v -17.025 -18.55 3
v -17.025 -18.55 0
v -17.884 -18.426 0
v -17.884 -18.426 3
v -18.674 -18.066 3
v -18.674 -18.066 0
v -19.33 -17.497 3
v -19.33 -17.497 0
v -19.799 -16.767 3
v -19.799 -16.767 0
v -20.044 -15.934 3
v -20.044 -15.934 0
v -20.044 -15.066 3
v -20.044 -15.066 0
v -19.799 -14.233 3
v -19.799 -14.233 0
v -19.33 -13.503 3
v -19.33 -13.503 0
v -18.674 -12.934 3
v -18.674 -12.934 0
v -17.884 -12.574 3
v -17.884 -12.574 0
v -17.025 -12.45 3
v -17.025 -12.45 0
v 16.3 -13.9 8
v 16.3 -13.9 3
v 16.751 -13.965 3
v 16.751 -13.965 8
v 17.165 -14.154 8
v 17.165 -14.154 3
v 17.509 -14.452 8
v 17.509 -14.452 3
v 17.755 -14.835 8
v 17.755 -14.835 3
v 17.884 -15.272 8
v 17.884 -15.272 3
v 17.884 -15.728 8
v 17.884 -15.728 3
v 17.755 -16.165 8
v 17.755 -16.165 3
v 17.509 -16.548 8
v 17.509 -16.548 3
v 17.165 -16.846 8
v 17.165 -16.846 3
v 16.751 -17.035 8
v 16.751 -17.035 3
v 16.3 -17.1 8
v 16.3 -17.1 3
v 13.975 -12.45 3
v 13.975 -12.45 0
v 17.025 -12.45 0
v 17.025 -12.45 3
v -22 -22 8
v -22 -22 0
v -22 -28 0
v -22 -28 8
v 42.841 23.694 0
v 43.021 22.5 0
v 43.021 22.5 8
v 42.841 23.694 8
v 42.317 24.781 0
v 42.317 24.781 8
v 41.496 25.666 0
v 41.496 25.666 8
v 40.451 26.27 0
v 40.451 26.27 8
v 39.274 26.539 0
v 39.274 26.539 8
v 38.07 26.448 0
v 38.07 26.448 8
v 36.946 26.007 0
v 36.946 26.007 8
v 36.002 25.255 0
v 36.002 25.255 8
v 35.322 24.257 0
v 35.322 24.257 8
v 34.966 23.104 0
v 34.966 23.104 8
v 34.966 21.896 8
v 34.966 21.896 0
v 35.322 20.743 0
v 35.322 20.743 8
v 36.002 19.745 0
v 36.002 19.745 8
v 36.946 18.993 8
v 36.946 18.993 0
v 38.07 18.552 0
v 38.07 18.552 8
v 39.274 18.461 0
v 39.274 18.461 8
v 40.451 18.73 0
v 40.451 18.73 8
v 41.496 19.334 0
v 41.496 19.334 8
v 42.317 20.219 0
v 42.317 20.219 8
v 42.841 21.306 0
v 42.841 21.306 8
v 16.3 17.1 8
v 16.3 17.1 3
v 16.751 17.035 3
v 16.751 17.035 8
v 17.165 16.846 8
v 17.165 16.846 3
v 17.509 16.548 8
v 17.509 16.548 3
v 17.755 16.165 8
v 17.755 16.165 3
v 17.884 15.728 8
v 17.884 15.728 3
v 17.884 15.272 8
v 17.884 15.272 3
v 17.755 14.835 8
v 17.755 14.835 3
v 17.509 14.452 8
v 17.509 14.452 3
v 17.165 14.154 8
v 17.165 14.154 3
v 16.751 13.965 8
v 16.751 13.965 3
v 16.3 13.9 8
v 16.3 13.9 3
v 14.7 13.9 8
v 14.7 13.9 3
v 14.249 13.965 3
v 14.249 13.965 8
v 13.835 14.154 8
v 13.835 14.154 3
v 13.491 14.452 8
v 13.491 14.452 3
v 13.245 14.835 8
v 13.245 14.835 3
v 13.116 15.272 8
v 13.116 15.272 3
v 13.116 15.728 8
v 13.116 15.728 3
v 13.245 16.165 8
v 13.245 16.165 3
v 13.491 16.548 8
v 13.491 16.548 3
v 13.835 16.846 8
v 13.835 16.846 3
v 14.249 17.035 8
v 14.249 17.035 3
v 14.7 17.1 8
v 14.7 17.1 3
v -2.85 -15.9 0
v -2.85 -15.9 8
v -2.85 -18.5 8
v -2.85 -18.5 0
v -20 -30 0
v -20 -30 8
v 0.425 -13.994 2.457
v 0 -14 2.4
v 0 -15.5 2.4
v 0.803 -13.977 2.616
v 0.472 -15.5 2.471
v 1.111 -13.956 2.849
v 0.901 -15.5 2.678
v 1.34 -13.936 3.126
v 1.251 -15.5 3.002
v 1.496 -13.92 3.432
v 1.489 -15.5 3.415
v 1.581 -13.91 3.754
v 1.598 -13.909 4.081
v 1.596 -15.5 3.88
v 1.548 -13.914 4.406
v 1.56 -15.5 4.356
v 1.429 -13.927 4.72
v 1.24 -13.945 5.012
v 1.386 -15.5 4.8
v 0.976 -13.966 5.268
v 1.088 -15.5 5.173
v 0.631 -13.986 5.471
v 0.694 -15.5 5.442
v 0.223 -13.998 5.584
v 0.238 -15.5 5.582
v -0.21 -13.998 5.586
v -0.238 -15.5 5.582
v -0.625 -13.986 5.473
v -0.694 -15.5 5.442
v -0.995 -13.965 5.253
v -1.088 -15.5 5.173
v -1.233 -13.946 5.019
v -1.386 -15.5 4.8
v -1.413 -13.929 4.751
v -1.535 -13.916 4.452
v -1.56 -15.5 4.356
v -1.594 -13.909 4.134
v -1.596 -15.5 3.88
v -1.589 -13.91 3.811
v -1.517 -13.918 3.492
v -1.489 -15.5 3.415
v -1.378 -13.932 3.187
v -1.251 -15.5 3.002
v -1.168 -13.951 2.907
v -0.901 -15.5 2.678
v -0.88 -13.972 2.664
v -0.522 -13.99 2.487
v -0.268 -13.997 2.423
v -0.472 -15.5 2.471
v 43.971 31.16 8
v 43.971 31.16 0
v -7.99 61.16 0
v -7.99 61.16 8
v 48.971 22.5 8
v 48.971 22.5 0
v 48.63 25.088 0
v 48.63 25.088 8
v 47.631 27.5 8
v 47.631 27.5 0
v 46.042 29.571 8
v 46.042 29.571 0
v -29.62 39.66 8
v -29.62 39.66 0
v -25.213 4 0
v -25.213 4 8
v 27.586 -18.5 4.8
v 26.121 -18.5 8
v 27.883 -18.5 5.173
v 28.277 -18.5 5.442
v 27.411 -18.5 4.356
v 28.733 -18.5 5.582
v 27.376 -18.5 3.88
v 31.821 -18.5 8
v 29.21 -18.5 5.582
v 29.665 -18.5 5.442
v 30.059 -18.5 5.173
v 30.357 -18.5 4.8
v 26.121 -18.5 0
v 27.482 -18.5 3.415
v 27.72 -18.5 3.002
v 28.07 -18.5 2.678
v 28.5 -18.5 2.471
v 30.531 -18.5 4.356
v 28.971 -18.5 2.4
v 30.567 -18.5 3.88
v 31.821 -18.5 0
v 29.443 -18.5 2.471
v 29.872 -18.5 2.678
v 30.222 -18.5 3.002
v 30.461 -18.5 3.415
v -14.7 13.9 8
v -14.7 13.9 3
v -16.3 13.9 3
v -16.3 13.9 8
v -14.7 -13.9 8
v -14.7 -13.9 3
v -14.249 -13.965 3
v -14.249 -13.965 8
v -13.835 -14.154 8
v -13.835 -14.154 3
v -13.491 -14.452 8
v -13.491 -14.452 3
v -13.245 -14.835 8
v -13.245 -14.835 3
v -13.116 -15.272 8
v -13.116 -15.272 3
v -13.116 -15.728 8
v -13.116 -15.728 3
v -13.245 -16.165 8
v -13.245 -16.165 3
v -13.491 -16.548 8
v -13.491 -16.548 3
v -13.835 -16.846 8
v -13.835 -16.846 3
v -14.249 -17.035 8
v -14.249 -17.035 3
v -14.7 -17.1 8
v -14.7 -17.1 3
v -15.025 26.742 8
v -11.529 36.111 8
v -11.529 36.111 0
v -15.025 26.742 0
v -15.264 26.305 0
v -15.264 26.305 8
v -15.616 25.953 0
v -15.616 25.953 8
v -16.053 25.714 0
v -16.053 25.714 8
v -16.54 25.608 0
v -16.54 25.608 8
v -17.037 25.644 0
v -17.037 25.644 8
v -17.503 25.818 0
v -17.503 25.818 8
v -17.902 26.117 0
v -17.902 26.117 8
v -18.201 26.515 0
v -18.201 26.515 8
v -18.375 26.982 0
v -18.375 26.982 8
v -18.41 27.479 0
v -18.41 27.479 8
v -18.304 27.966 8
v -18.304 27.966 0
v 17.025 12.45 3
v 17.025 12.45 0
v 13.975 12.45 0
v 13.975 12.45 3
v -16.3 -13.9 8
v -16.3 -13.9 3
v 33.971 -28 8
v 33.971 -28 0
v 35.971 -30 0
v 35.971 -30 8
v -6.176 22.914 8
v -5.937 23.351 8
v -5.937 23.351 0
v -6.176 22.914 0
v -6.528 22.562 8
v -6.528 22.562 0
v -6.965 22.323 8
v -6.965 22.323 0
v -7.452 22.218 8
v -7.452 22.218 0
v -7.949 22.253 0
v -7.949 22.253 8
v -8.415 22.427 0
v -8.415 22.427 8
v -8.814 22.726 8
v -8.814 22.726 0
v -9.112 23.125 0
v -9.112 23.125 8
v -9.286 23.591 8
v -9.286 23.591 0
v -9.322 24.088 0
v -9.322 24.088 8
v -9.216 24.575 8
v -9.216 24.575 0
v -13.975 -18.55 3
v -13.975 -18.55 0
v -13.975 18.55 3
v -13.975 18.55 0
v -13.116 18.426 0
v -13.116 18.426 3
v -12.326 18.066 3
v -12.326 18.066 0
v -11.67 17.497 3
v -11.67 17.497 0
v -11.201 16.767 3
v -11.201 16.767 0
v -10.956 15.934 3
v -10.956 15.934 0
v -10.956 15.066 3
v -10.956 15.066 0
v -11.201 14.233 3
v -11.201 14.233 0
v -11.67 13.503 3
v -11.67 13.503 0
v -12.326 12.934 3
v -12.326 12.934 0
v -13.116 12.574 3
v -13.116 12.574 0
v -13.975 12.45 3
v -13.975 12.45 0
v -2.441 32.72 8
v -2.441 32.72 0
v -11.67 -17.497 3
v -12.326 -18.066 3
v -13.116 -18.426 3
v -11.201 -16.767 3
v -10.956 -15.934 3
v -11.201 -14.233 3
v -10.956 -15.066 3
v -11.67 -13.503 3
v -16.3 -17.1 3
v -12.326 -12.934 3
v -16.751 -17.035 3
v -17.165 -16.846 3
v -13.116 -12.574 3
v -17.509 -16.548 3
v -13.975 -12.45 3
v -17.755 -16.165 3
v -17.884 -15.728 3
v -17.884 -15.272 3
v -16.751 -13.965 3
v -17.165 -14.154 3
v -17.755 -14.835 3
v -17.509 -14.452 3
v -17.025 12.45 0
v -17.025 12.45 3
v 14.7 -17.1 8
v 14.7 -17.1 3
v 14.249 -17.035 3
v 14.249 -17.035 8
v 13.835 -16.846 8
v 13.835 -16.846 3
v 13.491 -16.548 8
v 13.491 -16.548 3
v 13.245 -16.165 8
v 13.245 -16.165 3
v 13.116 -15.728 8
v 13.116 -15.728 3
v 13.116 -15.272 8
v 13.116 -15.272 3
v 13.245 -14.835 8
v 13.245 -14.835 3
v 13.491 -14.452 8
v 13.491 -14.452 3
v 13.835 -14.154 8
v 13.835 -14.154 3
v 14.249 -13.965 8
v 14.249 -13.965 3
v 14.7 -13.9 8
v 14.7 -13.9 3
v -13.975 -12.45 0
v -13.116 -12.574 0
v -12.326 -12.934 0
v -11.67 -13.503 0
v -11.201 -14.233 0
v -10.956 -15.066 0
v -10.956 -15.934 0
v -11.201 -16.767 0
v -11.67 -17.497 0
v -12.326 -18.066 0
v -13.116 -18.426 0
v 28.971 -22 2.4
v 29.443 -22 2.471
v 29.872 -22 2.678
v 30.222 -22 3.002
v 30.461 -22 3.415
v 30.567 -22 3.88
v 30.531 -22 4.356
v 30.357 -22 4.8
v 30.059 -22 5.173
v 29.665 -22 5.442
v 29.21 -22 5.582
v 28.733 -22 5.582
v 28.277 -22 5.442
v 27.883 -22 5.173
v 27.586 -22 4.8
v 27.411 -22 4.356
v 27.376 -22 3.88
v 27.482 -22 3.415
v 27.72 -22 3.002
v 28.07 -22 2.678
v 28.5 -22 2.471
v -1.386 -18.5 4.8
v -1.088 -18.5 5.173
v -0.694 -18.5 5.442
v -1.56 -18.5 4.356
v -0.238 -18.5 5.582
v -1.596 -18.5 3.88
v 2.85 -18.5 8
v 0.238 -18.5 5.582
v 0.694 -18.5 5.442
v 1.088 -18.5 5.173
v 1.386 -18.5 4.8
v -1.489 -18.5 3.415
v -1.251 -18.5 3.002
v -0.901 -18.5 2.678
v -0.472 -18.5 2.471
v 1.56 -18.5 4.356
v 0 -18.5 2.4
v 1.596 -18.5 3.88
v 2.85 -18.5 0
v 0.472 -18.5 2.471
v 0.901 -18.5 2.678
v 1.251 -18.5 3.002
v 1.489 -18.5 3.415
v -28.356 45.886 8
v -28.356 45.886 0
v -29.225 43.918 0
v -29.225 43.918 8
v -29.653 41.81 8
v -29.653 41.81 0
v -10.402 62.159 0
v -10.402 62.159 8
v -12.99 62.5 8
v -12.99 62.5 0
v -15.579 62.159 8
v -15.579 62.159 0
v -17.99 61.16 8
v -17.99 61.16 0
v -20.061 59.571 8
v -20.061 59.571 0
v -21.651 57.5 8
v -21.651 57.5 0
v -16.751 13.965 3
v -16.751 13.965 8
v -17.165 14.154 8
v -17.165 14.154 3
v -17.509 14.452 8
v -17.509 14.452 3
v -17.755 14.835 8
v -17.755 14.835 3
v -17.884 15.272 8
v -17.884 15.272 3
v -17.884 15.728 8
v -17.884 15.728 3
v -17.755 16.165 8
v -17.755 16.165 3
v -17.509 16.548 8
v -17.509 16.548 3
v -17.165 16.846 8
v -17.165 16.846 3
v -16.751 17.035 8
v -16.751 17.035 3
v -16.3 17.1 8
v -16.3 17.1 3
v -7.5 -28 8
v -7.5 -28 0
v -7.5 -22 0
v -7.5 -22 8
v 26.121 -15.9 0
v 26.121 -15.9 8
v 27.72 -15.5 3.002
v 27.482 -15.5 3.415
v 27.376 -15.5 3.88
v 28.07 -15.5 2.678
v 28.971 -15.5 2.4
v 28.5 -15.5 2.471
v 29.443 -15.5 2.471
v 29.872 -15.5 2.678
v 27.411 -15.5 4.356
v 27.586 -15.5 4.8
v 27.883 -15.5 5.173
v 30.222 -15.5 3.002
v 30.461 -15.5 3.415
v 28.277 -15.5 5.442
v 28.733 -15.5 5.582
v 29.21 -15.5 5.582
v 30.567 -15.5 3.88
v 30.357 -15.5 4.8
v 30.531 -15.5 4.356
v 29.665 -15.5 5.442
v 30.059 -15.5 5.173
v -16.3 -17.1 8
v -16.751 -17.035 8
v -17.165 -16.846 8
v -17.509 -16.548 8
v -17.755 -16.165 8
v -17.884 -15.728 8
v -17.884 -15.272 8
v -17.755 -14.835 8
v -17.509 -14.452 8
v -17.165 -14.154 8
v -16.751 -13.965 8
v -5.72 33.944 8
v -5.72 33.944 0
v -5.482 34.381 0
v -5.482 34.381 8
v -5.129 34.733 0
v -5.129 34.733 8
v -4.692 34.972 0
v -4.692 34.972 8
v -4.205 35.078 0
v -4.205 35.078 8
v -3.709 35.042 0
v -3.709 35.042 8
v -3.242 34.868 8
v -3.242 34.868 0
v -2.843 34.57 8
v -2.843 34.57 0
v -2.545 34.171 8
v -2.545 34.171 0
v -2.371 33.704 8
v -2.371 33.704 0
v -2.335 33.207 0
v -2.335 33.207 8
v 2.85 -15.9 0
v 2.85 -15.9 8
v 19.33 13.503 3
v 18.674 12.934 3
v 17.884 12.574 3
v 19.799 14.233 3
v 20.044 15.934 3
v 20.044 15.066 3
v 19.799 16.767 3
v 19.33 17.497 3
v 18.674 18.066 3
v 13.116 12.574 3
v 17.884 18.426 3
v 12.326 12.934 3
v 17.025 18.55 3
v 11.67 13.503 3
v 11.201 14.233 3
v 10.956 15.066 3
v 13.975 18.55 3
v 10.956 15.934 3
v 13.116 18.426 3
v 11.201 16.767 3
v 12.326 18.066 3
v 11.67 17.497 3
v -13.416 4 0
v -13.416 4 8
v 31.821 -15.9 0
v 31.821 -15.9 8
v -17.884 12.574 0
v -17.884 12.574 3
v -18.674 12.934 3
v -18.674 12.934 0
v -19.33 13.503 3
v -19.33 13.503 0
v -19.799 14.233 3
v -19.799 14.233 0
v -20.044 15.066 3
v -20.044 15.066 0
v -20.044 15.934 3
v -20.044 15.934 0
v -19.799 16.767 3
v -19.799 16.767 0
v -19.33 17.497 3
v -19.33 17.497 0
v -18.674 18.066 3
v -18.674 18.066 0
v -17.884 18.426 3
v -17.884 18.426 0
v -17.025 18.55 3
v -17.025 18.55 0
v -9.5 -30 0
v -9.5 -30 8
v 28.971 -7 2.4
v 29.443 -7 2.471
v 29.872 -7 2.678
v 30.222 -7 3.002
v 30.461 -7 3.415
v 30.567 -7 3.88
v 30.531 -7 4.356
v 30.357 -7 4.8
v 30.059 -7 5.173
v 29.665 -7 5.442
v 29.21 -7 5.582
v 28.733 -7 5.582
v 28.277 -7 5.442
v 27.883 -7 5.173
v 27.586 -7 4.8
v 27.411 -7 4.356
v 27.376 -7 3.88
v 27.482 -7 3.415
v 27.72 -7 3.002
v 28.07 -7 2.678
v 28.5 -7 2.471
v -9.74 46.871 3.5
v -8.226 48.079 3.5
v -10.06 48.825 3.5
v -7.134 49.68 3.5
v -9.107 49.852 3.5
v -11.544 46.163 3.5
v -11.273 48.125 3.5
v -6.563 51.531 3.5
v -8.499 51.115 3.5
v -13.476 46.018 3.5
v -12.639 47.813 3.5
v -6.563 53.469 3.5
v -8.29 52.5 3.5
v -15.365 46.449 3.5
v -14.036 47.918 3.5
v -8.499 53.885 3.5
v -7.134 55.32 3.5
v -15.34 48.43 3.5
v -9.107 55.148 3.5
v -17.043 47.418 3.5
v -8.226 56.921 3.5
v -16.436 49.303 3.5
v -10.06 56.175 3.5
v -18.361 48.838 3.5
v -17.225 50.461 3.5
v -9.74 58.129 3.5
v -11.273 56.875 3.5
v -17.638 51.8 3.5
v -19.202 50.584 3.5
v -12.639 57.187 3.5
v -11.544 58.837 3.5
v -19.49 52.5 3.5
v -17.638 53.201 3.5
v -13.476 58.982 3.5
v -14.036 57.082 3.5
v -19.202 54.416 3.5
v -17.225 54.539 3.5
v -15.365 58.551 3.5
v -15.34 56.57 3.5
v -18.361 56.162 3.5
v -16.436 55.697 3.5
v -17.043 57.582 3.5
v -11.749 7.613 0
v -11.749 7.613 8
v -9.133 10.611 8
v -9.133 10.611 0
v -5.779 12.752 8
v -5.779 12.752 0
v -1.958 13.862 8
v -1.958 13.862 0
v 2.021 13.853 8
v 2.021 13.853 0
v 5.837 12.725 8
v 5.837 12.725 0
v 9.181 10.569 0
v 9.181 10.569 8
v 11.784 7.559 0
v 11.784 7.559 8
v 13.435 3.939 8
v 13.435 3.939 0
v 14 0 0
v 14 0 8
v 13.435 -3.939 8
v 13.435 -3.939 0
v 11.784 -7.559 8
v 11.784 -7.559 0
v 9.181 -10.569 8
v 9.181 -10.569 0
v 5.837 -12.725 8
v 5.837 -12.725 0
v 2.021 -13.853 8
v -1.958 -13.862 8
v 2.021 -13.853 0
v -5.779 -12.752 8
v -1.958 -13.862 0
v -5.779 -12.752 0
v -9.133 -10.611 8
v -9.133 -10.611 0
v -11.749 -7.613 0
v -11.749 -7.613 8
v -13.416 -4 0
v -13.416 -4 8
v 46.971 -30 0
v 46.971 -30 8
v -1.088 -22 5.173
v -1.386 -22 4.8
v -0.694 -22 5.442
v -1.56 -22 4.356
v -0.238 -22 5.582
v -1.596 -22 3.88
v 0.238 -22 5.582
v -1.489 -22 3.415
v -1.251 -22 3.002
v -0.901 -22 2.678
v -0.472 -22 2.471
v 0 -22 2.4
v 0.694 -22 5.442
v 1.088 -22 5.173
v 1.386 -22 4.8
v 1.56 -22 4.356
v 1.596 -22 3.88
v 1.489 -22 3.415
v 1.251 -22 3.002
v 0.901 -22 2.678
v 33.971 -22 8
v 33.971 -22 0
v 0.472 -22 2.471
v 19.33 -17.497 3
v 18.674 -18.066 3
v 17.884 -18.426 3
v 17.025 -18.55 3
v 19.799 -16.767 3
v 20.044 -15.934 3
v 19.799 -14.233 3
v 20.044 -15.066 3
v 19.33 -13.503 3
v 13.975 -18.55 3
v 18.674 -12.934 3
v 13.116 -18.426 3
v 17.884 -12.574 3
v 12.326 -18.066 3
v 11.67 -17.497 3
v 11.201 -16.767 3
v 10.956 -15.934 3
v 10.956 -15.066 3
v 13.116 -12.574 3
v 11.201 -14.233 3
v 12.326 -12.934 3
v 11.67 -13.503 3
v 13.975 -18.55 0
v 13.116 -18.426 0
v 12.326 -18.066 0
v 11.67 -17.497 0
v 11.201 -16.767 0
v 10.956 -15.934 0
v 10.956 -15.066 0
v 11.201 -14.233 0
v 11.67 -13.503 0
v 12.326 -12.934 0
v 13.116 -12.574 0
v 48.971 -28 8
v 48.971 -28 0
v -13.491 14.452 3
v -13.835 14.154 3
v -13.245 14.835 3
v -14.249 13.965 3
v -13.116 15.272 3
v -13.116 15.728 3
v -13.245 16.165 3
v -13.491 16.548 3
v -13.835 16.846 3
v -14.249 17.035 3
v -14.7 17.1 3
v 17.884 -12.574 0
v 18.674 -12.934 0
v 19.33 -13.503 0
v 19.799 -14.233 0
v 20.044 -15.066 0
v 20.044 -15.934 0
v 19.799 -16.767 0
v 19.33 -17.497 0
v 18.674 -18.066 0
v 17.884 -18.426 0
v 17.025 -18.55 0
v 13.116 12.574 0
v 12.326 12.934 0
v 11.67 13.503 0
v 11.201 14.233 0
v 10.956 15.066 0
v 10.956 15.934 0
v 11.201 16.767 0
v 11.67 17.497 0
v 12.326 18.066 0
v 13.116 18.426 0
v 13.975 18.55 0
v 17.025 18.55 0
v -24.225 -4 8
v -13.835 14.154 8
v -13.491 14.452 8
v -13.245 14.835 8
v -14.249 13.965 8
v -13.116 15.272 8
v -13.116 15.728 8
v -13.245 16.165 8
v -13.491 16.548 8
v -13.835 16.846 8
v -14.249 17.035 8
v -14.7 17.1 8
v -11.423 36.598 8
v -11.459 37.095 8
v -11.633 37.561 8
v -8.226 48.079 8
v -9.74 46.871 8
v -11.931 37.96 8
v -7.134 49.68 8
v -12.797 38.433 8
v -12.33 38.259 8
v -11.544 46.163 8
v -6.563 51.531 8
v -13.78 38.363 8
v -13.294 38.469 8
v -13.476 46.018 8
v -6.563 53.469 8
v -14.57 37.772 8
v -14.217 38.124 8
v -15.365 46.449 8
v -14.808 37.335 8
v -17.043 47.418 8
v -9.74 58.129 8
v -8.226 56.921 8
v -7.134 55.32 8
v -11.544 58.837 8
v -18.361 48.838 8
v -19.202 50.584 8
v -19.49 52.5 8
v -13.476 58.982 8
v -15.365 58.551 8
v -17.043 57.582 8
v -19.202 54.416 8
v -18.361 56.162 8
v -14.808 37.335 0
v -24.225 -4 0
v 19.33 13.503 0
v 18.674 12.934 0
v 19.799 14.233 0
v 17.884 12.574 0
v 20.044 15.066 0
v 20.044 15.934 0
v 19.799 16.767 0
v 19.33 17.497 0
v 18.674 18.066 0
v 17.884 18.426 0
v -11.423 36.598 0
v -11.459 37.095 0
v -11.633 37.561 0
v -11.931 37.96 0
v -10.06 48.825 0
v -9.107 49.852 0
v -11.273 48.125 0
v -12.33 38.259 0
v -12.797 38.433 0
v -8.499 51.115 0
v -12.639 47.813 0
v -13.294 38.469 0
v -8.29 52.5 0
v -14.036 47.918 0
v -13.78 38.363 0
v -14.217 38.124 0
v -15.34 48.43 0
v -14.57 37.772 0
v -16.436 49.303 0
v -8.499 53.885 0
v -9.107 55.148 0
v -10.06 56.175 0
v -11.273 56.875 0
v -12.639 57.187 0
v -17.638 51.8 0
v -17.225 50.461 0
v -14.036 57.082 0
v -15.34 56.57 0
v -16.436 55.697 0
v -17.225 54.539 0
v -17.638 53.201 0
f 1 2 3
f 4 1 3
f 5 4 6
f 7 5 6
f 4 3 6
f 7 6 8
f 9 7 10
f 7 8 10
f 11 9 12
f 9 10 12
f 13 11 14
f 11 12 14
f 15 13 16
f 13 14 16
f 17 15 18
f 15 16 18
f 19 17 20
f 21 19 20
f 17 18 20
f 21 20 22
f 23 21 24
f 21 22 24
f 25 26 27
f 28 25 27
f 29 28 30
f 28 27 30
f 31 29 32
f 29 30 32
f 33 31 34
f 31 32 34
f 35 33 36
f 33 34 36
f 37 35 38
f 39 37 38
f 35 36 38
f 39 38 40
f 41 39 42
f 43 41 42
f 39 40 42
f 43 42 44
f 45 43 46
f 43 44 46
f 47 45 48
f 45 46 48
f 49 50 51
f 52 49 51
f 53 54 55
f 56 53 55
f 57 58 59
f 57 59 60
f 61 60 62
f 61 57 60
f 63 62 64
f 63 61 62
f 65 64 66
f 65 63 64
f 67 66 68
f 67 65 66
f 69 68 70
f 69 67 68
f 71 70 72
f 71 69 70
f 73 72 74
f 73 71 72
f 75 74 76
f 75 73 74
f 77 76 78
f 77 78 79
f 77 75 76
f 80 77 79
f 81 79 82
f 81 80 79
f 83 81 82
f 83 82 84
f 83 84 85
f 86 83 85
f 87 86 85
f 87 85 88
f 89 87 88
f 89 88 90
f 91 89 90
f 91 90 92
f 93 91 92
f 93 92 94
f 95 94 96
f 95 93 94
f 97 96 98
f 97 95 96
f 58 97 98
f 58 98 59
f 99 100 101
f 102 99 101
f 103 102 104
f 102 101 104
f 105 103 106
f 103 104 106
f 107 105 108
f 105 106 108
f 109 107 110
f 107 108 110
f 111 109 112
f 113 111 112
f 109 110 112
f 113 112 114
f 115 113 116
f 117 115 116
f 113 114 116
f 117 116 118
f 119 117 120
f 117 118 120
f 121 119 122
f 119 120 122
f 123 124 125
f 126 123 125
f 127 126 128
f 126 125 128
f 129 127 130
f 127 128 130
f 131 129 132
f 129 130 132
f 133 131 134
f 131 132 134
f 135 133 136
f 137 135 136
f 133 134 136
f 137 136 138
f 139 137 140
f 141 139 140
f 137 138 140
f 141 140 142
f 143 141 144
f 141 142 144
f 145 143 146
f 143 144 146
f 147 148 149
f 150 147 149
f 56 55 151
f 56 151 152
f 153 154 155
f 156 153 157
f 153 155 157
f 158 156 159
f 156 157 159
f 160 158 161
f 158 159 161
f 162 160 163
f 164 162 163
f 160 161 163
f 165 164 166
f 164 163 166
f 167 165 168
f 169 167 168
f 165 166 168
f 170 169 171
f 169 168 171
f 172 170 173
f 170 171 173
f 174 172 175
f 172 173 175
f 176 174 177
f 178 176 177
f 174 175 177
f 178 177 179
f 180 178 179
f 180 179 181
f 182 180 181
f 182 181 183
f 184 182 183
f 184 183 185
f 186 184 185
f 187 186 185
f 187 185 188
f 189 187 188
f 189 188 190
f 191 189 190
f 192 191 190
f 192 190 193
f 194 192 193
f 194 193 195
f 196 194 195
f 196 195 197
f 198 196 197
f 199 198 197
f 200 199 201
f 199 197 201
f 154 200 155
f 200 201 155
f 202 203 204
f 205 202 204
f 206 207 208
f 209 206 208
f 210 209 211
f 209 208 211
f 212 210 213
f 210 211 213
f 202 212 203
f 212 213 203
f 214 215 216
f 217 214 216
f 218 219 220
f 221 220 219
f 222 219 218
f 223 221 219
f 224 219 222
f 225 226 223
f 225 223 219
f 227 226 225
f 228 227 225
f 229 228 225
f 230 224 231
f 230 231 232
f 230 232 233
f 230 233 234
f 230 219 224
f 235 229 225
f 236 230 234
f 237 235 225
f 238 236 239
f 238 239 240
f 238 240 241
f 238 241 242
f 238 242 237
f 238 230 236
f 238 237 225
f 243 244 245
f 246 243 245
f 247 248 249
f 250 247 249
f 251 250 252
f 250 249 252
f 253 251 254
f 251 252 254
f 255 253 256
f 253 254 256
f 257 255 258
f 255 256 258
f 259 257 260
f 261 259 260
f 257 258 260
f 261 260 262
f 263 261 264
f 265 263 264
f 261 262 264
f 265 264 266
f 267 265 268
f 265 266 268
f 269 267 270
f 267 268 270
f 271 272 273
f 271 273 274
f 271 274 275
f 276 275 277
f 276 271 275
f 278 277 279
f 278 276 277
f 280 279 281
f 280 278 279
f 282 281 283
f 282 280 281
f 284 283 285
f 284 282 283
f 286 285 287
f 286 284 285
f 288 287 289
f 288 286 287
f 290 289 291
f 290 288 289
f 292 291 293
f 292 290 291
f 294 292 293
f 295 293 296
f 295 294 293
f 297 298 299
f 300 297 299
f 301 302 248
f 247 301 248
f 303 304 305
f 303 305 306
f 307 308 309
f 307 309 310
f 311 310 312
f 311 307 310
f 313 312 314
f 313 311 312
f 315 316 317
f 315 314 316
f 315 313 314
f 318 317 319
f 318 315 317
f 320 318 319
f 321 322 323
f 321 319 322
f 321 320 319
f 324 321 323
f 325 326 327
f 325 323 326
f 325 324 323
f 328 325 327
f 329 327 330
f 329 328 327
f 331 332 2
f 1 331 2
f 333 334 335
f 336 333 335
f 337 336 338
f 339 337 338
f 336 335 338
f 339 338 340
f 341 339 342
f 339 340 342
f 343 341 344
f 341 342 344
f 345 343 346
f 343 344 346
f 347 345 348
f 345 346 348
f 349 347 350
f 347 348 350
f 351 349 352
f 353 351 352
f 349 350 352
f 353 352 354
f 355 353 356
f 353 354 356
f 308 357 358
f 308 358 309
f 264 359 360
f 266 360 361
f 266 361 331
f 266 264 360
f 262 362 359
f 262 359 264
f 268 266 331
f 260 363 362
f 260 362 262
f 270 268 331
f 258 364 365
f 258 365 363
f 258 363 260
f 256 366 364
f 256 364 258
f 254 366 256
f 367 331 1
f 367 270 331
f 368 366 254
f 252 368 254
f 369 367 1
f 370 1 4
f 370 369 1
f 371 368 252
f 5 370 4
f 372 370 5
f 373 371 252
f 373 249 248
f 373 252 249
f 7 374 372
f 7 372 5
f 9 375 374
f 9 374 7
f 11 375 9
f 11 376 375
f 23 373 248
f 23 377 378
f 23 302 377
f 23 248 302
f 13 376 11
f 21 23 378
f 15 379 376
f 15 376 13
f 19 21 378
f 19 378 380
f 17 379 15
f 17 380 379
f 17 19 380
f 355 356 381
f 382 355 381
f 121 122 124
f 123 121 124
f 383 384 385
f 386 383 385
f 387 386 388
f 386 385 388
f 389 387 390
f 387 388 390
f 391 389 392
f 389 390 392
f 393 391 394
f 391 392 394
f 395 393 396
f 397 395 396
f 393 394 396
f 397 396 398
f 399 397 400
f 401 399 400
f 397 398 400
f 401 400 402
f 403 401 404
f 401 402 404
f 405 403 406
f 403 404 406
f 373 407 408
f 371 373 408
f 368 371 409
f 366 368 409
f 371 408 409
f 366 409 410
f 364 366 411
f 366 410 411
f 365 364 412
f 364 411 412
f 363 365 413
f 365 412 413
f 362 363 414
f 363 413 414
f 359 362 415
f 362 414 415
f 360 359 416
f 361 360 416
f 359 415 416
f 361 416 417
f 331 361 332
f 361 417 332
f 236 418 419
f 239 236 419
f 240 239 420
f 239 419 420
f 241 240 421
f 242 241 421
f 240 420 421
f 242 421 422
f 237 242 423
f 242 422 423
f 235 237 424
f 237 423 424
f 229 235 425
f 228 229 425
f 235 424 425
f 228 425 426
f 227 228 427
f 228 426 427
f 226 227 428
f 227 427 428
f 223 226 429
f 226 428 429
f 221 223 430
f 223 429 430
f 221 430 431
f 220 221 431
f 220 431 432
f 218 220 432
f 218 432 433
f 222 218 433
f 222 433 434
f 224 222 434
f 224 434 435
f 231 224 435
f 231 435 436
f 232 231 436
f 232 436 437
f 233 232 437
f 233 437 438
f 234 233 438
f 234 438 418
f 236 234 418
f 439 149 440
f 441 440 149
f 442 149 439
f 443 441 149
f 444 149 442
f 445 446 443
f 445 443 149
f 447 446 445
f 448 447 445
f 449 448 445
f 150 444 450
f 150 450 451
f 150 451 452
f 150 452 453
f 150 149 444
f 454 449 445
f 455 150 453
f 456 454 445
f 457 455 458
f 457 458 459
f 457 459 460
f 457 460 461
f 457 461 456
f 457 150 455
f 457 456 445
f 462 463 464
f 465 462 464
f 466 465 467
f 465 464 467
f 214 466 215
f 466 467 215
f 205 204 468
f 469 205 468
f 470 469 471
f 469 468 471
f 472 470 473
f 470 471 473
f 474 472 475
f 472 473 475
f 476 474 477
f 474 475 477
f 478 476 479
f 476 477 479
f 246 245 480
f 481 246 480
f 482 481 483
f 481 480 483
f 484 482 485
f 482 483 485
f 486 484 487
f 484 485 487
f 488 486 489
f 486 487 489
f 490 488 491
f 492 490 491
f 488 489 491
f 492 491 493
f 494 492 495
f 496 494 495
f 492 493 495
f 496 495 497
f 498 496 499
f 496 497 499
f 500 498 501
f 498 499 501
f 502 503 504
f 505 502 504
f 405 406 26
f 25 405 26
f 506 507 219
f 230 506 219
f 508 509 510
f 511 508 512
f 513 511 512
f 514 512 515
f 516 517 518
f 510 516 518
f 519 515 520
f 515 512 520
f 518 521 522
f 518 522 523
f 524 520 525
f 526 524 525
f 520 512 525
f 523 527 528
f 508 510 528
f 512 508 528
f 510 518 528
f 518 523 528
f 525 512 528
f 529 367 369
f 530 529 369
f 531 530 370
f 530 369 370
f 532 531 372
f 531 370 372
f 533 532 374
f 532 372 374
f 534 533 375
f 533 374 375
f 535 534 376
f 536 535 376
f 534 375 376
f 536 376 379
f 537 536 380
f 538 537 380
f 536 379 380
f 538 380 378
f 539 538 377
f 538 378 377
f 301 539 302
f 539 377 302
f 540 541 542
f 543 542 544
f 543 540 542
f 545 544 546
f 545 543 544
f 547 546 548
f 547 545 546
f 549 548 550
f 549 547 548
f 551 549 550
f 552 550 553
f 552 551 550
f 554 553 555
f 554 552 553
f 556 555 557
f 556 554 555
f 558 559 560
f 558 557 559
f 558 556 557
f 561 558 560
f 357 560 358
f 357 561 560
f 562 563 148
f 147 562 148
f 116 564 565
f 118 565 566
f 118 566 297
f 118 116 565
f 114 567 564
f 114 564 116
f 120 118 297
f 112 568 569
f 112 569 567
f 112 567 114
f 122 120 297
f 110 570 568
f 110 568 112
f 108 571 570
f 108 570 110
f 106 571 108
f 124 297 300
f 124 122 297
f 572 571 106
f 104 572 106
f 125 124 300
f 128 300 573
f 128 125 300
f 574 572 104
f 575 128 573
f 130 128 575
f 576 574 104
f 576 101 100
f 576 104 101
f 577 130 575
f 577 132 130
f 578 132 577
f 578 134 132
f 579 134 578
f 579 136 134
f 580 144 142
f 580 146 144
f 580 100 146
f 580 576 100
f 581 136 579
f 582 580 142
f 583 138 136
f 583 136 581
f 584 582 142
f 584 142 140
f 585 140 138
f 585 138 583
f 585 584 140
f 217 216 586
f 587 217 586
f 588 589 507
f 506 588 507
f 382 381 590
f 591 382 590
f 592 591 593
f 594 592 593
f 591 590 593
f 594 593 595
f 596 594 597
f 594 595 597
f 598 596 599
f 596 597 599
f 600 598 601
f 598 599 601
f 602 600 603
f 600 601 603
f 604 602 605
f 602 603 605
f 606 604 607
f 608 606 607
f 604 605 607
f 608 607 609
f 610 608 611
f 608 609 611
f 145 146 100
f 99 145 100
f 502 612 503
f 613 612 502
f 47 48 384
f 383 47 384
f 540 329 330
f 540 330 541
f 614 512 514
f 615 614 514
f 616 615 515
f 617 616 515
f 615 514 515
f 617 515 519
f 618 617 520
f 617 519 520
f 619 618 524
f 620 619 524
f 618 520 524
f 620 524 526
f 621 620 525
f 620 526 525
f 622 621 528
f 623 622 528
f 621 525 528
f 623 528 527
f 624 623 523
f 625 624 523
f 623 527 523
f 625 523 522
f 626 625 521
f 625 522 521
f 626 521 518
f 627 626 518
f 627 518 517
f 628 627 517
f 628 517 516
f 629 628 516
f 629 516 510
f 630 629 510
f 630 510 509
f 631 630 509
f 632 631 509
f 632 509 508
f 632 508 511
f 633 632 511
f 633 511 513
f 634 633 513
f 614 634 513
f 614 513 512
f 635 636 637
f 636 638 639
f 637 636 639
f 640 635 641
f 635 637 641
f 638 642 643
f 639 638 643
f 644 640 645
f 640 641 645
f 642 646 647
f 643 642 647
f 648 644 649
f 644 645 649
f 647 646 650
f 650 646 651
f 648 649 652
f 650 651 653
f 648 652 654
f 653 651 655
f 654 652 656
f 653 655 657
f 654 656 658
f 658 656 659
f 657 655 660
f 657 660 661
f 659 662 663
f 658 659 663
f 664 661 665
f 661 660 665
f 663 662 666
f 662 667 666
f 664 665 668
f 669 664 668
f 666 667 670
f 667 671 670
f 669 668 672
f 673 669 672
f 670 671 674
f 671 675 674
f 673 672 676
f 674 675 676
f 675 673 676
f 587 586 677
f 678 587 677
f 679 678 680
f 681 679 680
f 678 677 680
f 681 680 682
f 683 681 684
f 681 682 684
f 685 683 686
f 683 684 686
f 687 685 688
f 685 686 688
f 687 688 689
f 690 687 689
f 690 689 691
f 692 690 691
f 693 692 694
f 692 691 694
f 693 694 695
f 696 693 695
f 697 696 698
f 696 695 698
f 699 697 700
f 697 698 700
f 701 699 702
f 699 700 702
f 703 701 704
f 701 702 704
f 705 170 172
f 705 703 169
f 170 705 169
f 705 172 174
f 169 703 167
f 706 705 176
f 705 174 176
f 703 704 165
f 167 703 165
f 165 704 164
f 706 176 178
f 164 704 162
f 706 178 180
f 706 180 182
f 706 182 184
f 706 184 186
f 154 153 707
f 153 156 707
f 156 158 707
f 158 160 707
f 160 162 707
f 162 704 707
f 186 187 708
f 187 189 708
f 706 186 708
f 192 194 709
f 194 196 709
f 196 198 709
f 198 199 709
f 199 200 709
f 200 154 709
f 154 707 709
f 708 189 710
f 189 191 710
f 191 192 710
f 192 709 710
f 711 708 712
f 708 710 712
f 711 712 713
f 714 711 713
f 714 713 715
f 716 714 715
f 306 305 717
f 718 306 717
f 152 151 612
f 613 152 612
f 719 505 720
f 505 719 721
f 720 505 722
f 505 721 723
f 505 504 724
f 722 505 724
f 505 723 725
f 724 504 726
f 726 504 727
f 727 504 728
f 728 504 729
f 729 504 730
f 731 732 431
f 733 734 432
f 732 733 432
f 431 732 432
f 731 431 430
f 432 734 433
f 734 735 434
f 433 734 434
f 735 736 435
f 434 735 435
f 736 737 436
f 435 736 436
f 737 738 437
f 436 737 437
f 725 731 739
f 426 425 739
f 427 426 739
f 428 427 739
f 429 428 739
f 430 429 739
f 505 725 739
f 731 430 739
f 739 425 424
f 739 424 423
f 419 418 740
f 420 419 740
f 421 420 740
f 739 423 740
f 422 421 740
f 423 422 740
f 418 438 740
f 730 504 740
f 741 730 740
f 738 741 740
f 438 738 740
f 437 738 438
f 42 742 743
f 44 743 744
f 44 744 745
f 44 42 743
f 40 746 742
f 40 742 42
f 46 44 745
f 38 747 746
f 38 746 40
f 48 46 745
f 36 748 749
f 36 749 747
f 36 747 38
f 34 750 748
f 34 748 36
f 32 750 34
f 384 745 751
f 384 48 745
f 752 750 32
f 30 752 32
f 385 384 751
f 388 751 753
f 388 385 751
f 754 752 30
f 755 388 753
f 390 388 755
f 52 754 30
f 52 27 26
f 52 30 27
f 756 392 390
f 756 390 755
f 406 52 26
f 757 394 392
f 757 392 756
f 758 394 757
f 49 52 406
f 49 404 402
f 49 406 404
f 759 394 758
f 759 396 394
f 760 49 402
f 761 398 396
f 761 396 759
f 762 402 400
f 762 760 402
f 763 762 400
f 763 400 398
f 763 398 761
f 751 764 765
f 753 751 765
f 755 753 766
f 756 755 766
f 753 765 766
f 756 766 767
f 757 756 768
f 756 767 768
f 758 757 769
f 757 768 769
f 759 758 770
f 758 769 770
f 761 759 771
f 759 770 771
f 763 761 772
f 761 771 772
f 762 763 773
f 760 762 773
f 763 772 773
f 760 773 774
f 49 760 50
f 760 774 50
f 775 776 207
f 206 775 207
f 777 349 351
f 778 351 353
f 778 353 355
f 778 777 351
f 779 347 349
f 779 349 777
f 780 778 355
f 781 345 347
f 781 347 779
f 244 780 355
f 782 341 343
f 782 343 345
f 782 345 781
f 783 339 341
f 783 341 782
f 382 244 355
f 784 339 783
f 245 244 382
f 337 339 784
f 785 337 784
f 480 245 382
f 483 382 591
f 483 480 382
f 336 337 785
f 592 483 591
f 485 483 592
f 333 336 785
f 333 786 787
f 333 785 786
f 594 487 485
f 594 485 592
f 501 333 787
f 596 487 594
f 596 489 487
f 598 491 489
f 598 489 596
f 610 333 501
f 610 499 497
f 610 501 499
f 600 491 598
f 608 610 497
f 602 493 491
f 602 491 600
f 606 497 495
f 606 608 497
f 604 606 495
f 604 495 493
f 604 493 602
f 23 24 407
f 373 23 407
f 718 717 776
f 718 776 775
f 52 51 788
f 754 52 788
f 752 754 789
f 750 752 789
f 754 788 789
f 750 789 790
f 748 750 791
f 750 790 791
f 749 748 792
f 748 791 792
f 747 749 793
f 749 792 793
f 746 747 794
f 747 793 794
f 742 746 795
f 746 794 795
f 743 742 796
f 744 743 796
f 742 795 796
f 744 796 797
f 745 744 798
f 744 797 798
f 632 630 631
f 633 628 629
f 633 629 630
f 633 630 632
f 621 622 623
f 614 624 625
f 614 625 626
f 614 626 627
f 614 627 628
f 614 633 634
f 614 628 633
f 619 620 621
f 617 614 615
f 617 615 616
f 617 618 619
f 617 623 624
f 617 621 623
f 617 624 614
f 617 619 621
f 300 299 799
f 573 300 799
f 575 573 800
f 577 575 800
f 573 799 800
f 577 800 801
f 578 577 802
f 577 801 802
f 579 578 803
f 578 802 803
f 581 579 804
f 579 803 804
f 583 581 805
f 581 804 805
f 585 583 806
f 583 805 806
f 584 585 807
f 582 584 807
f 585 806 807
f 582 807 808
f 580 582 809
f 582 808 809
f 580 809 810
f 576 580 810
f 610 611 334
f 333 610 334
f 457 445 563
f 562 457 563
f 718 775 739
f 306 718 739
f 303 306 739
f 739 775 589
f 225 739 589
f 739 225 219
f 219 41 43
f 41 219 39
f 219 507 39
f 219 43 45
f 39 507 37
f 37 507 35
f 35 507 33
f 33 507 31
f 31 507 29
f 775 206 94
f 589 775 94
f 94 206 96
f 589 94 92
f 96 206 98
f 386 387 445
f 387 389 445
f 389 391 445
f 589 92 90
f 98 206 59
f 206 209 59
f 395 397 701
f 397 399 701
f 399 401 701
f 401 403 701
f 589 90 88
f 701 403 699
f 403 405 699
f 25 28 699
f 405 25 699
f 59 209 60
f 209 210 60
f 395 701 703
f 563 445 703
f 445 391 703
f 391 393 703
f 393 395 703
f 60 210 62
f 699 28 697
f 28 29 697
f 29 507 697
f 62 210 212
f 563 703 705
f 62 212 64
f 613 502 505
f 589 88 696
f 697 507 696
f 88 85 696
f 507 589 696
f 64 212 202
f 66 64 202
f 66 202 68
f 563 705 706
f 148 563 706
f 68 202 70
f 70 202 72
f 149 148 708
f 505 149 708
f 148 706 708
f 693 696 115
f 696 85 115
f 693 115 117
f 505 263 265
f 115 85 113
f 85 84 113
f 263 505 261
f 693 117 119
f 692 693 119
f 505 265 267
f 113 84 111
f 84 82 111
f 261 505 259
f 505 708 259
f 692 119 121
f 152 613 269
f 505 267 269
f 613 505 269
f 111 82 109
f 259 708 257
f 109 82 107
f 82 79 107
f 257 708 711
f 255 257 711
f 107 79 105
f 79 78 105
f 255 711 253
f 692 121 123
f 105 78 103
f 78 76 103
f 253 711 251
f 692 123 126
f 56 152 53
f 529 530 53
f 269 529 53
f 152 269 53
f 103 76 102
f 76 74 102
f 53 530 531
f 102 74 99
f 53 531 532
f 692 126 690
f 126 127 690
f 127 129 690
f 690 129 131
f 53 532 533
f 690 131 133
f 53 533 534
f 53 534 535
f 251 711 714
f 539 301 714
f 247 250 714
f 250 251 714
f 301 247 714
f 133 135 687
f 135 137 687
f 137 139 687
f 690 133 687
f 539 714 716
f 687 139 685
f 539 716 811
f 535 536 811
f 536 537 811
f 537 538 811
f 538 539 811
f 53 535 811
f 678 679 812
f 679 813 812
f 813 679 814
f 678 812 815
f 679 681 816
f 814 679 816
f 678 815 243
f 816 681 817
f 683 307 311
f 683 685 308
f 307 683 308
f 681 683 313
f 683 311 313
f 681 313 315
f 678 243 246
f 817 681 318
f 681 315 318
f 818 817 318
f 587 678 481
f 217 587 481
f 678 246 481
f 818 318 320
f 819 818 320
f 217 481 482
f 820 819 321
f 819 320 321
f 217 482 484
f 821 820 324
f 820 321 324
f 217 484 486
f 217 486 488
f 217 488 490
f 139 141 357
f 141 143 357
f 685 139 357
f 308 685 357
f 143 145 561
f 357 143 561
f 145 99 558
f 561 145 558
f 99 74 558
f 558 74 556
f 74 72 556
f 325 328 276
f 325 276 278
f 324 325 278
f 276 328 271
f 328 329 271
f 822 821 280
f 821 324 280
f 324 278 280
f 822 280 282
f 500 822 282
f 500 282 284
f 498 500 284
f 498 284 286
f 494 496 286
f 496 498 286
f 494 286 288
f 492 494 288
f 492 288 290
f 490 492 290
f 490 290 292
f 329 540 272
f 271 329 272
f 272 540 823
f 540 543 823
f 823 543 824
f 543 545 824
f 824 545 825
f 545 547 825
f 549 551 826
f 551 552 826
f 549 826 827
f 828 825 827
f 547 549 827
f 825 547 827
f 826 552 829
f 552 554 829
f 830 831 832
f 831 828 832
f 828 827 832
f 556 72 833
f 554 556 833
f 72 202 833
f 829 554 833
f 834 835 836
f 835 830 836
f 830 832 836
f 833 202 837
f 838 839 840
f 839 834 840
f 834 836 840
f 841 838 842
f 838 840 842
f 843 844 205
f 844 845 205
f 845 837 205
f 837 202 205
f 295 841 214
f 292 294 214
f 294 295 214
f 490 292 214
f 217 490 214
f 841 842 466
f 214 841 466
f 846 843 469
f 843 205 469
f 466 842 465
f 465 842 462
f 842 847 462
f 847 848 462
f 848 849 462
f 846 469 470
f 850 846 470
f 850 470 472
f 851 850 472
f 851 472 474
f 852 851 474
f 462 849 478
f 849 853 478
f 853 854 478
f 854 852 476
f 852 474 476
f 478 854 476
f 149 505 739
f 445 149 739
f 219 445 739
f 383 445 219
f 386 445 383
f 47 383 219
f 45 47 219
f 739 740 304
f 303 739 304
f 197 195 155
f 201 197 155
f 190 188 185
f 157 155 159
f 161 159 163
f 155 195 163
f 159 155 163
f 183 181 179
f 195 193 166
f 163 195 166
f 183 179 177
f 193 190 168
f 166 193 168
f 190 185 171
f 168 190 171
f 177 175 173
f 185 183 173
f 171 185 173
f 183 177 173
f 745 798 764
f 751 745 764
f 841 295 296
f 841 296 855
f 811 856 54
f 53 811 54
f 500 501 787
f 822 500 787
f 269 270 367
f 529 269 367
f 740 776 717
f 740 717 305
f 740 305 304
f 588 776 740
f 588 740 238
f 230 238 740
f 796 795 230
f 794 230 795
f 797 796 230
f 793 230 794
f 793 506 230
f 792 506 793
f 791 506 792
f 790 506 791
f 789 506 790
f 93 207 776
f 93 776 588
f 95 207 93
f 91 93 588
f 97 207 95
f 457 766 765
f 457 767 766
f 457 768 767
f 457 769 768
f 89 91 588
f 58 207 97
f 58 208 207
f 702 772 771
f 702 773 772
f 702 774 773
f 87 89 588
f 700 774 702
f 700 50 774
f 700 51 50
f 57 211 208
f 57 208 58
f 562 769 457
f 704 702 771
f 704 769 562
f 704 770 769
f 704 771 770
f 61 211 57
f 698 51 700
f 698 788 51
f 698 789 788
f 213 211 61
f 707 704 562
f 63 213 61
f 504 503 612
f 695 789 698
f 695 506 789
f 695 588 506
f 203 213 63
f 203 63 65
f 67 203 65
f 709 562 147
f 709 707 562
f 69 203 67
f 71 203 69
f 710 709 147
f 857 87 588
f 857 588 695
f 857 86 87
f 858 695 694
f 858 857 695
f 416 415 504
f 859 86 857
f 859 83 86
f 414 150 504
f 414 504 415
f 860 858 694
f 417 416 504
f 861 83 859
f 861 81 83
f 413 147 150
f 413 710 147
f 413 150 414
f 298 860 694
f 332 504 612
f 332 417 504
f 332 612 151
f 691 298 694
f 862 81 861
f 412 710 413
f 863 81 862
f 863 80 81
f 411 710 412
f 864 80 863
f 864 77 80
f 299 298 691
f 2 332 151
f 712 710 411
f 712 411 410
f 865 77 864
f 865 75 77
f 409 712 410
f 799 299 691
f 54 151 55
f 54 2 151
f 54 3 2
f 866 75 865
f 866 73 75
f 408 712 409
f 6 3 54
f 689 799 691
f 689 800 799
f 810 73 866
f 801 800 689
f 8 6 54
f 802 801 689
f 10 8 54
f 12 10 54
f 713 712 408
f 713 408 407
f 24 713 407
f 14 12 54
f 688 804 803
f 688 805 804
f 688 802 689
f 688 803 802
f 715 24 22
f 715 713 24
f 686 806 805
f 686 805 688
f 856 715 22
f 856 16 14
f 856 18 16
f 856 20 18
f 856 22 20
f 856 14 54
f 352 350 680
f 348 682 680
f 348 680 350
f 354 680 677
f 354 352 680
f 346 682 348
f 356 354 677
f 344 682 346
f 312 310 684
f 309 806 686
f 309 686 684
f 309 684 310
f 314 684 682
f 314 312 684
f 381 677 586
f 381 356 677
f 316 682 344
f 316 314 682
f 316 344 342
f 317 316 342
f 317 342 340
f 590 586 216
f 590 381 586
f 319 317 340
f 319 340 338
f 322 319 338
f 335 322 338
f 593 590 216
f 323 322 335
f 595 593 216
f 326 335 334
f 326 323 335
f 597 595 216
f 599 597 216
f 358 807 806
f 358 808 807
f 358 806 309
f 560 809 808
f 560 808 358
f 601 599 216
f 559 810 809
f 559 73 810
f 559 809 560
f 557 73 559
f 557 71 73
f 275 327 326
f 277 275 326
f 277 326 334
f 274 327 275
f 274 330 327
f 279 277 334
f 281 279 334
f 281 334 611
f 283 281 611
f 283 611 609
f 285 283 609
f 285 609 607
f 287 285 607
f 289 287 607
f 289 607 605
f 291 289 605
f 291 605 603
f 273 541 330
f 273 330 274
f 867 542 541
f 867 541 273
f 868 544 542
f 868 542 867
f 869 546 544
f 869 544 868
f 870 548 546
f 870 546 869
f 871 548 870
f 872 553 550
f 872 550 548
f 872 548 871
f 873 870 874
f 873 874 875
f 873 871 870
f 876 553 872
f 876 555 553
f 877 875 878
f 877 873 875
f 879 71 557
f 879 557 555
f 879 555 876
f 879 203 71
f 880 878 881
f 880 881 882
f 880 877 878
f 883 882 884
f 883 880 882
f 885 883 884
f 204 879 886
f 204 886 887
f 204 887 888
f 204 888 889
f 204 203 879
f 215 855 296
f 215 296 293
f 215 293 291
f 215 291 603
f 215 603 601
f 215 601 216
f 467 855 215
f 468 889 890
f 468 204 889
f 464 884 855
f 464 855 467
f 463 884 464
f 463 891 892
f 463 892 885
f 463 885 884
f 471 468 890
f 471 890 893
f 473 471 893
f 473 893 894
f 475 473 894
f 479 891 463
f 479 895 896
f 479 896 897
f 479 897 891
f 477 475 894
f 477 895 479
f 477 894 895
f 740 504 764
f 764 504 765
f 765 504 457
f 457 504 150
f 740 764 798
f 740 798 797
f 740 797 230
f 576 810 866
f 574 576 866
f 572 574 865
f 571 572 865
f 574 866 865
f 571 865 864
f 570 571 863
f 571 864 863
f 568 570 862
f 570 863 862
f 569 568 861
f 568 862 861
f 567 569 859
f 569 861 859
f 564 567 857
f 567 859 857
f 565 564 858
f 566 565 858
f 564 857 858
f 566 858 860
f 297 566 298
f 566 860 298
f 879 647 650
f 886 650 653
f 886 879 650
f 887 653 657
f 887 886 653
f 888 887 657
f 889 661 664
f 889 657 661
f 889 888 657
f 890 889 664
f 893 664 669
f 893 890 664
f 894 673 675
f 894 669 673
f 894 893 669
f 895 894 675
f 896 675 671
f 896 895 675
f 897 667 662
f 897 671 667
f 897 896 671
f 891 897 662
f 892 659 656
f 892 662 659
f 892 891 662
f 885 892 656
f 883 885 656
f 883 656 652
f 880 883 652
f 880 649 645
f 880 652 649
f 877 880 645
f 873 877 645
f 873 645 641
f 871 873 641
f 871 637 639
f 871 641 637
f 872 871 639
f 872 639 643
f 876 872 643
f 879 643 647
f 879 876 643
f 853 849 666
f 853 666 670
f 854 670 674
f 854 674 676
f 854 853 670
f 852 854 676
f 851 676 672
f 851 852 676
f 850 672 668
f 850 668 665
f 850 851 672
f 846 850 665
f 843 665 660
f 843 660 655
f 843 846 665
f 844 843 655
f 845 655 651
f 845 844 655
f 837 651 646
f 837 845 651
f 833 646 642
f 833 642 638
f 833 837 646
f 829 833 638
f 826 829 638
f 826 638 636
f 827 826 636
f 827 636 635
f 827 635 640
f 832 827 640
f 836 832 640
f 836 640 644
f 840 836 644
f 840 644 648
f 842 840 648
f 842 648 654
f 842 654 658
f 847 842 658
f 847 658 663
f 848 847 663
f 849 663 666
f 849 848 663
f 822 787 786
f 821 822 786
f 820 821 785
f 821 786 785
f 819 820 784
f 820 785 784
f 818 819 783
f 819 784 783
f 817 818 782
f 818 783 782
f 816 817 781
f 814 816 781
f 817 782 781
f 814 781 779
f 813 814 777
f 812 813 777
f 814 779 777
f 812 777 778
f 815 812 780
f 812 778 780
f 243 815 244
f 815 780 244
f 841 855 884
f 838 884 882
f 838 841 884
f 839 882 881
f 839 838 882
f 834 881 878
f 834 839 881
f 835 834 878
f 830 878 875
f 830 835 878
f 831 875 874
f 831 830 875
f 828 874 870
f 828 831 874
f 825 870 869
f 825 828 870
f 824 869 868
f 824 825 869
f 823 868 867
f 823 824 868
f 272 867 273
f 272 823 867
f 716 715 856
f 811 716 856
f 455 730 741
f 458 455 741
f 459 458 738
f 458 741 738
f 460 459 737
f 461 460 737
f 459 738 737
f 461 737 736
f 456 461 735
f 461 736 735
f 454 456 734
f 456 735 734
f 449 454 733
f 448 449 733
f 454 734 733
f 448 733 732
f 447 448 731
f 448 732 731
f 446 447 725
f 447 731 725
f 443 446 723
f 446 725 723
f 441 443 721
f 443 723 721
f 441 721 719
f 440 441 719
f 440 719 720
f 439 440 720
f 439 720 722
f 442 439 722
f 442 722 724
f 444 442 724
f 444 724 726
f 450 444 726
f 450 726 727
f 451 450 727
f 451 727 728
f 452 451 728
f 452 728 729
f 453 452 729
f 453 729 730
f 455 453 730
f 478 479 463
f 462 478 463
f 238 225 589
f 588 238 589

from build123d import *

# Parameters (mm, degrees)
SKETCH_3_R          = 4.05
SKETCH_3_R_2        = 4.7
SKETCH_3_W          = 6.2
SKETCH_3_H          = 3
EXTRUDE_1_DEPTH     = 8
SKETCH_4_R          = 6.5
CUT_EXTRUDE_1_DEPTH = 4.5
CUT_EXTRUDE_2_DEPTH = 3
SKETCH_6_R          = 1.6
CUT_EXTRUDE_3_DEPTH = 15
SKETCH_7_R          = 4.05
CUT_EXTRUDE_4_DEPTH = 80.802401326
CHAMFER_1_SIZE      = 2
EXTRUDE_2_DEPTH     = 8


with BuildPart() as part:
    # 草图3 → 凸台-拉伸1 (new body)
    with BuildSketch(Plane.XY):
        with BuildLine():
            Line((43.971143614, 31.160253781), (-7.990379897, 61.160256921))
            ThreePointArc((-7.990379897, 61.160256921), (-15.578570545, 62.159261468), (-21.650634379, 57.500003139))
            Line((-21.650634379, 57.500003139), (-28.355968253, 45.886024187))
            ThreePointArc((-28.355968253, 45.886024187), (-29.495746829, 42.875838443), (-29.620211311, 39.659501706))
            Line((-29.620211311, 39.659501706), (-25.213219189, 4))
            Line((-25.213219189, 4), (-13.416407865, 4))
            ThreePointArc((-13.416407865, 4), (14, 0), (-13.416407865, -4))
            Line((-13.416407865, -4), (-24.224536362, -4))
            Line((-24.224536362, -4), (-22, -22))
            Line((-22, -22), (-22, -30))
            Line((-22, -30), (-7.5, -30))
            Line((-7.5, -30), (-7.5, -22))
            Line((-7.5, -22), (33.97114317, -22))
            Line((33.97114317, -22), (33.97114317, -30))
            Line((33.97114317, -30), (48.97114317, -30))
            Line((48.97114317, -30), (48.97114317, 22.5))
            ThreePointArc((48.97114317, 22.5), (47.631397336, 27.499999778), (43.971143614, 31.160253781))
        make_face()
        with Locations((38.97114317, 22.5)):
            Circle(SKETCH_3_R, mode=Mode.SUBTRACT)
        with Locations((-12.990380341, 52.500003139)):
            Circle(SKETCH_3_R_2, mode=Mode.SUBTRACT)
        with BuildLine():
            Line((-16.3, 17.1), (-14.7, 17.1))
            ThreePointArc((-14.7, 17.1), (-13.1, 15.5), (-14.7, 13.9))
            Line((-14.7, 13.9), (-16.3, 13.9))
            ThreePointArc((-16.3, 13.9), (-17.9, 15.5), (-16.3, 17.1))
        make_face(mode=Mode.SUBTRACT)
        with BuildLine():
            Line((14.7, 17.1), (16.3, 17.1))
            ThreePointArc((16.3, 17.1), (17.9, 15.5), (16.3, 13.9))
            Line((16.3, 13.9), (14.7, 13.9))
            ThreePointArc((14.7, 13.9), (13.1, 15.5), (14.7, 17.1))
        make_face(mode=Mode.SUBTRACT)
        with BuildLine():
            Line((14.7, -13.9), (16.3, -13.9))
            ThreePointArc((16.3, -13.9), (17.9, -15.5), (16.3, -17.1))
            Line((16.3, -17.1), (14.7, -17.1))
            ThreePointArc((14.7, -17.1), (13.1, -15.5), (14.7, -13.9))
        make_face(mode=Mode.SUBTRACT)
        with BuildLine():
            Line((-16.3, -13.9), (-14.7, -13.9))
            ThreePointArc((-14.7, -13.9), (-13.1, -15.5), (-14.7, -17.1))
            Line((-14.7, -17.1), (-16.3, -17.1))
            ThreePointArc((-16.3, -17.1), (-17.9, -15.5), (-16.3, -13.9))
        make_face(mode=Mode.SUBTRACT)
        with Locations((0, -17)):
            Rectangle(SKETCH_3_W, SKETCH_3_H, mode=Mode.SUBTRACT)
        with Locations((28.97114317, -17)):
            Rectangle(SKETCH_3_W, SKETCH_3_H, mode=Mode.SUBTRACT)
    extrude(amount=EXTRUDE_1_DEPTH)

    # 草图4 → 切除-拉伸1 (cut)
    with BuildSketch(Plane(origin=(0, 0, 8), x_dir=(-1, 0, 0), z_dir=(0, 0, -1))):
        with Locations((12.990380341, 52.500003139)):
            Circle(SKETCH_4_R)
    extrude(amount=CUT_EXTRUDE_1_DEPTH, mode=Mode.SUBTRACT)

    # 草图5 → 切除-拉伸2 (cut)
    with BuildSketch(Plane.XY):
        with BuildLine():
            Line((-17.025, 18.55), (-13.975, 18.55))
            ThreePointArc((-13.975, 18.55), (-10.925, 15.5), (-13.975, 12.45))
            Line((-13.975, 12.45), (-17.025, 12.45))
            ThreePointArc((-17.025, 12.45), (-20.075, 15.5), (-17.025, 18.55))
        make_face()
        with BuildLine():
            Line((13.975, 18.55), (17.025, 18.55))
            ThreePointArc((17.025, 18.55), (20.075, 15.5), (17.025, 12.45))
            Line((17.025, 12.45), (13.975, 12.45))
            ThreePointArc((13.975, 12.45), (10.925, 15.5), (13.975, 18.55))
        make_face()
        with BuildLine():
            Line((13.975, -12.45), (17.025, -12.45))
            ThreePointArc((17.025, -12.45), (20.075, -15.5), (17.025, -18.55))
            Line((17.025, -18.55), (13.975, -18.55))
            ThreePointArc((13.975, -18.55), (10.925, -15.5), (13.975, -12.45))
        make_face()
        with BuildLine():
            Line((-17.025, -12.45), (-13.975, -12.45))
            ThreePointArc((-13.975, -12.45), (-10.925, -15.5), (-13.975, -18.55))
            Line((-13.975, -18.55), (-17.025, -18.55))
            ThreePointArc((-17.025, -18.55), (-20.075, -15.5), (-17.025, -12.45))
        make_face()
    extrude(amount=CUT_EXTRUDE_2_DEPTH, mode=Mode.SUBTRACT)

    # 草图6 → 切除-拉伸3 (cut)
    with BuildSketch(Plane.XZ.offset(22)):
        with Locations(Location((0, 4, 0), (0, 0, 270))):
            Circle(SKETCH_6_R)
        with Locations(Location((28.97114317, 4, 0), (0, 0, 270))):
            Circle(SKETCH_6_R)
    extrude(amount=-CUT_EXTRUDE_3_DEPTH, mode=Mode.SUBTRACT)

    # 草图7 → 切除-拉伸4 (cut, through all)
    with BuildSketch(Plane.XY.offset(8)):
        with Locations((38.97114317, 22.5)):
            Circle(SKETCH_7_R)
        with BuildLine():
            Line((-9.216024373, 24.574816528), (-5.72042198, 33.943955438))
            ThreePointArc((-5.72042198, 33.943955438), (-3.469092252, 34.971824328), (-2.441223361, 32.7204946))
            Line((-2.441223361, 32.7204946), (-5.936825754, 23.35135569))
            ThreePointArc((-5.936825754, 23.35135569), (-8.188156046, 22.323485289), (-9.216024373, 24.574816528))
        make_face()
        with BuildLine():
            Line((-18.304089115, 27.965550849), (-14.808486722, 37.334689759))
            ThreePointArc((-14.808486722, 37.334689759), (-12.557156994, 38.362558649), (-11.529288104, 36.111228921))
            Line((-11.529288104, 36.111228921), (-15.024890497, 26.742090011))
            ThreePointArc((-15.024890497, 26.742090011), (-17.276220788, 25.71421961), (-18.304089115, 27.965550849))
        make_face()
    extrude(amount=-CUT_EXTRUDE_4_DEPTH, mode=Mode.SUBTRACT)

    # 倒角1
    chamfer_1_edges = [part.edges().sort_by_distance(p)[0] for p in [
        (48.97114317, -30, 4),
        (33.97114317, -30, 4),
        (-7.5, -30, 4),
        (-22, -30, 4),
    ]]
    chamfer(chamfer_1_edges, length=CHAMFER_1_SIZE)

    # 草图9 → 凸台-拉伸2 (add)
    with BuildSketch(Plane.XY.offset(8)):
        Polygon((2.85, -15.9), (-2.85, -15.9), (-2.85, -18.5), (-3.1, -18.5), (-3.1, -15.5), (3.1, -15.5), (3.1, -18.5), (2.85, -18.5), align=None)
        Polygon((31.82114317, -15.9), (26.12114317, -15.9), (26.12114317, -18.5), (25.87114317, -18.5), (25.87114317, -15.5), (32.07114317, -15.5), (32.07114317, -18.5), (31.82114317, -18.5), align=None)
    extrude(amount=-EXTRUDE_2_DEPTH)


solid = part.part
